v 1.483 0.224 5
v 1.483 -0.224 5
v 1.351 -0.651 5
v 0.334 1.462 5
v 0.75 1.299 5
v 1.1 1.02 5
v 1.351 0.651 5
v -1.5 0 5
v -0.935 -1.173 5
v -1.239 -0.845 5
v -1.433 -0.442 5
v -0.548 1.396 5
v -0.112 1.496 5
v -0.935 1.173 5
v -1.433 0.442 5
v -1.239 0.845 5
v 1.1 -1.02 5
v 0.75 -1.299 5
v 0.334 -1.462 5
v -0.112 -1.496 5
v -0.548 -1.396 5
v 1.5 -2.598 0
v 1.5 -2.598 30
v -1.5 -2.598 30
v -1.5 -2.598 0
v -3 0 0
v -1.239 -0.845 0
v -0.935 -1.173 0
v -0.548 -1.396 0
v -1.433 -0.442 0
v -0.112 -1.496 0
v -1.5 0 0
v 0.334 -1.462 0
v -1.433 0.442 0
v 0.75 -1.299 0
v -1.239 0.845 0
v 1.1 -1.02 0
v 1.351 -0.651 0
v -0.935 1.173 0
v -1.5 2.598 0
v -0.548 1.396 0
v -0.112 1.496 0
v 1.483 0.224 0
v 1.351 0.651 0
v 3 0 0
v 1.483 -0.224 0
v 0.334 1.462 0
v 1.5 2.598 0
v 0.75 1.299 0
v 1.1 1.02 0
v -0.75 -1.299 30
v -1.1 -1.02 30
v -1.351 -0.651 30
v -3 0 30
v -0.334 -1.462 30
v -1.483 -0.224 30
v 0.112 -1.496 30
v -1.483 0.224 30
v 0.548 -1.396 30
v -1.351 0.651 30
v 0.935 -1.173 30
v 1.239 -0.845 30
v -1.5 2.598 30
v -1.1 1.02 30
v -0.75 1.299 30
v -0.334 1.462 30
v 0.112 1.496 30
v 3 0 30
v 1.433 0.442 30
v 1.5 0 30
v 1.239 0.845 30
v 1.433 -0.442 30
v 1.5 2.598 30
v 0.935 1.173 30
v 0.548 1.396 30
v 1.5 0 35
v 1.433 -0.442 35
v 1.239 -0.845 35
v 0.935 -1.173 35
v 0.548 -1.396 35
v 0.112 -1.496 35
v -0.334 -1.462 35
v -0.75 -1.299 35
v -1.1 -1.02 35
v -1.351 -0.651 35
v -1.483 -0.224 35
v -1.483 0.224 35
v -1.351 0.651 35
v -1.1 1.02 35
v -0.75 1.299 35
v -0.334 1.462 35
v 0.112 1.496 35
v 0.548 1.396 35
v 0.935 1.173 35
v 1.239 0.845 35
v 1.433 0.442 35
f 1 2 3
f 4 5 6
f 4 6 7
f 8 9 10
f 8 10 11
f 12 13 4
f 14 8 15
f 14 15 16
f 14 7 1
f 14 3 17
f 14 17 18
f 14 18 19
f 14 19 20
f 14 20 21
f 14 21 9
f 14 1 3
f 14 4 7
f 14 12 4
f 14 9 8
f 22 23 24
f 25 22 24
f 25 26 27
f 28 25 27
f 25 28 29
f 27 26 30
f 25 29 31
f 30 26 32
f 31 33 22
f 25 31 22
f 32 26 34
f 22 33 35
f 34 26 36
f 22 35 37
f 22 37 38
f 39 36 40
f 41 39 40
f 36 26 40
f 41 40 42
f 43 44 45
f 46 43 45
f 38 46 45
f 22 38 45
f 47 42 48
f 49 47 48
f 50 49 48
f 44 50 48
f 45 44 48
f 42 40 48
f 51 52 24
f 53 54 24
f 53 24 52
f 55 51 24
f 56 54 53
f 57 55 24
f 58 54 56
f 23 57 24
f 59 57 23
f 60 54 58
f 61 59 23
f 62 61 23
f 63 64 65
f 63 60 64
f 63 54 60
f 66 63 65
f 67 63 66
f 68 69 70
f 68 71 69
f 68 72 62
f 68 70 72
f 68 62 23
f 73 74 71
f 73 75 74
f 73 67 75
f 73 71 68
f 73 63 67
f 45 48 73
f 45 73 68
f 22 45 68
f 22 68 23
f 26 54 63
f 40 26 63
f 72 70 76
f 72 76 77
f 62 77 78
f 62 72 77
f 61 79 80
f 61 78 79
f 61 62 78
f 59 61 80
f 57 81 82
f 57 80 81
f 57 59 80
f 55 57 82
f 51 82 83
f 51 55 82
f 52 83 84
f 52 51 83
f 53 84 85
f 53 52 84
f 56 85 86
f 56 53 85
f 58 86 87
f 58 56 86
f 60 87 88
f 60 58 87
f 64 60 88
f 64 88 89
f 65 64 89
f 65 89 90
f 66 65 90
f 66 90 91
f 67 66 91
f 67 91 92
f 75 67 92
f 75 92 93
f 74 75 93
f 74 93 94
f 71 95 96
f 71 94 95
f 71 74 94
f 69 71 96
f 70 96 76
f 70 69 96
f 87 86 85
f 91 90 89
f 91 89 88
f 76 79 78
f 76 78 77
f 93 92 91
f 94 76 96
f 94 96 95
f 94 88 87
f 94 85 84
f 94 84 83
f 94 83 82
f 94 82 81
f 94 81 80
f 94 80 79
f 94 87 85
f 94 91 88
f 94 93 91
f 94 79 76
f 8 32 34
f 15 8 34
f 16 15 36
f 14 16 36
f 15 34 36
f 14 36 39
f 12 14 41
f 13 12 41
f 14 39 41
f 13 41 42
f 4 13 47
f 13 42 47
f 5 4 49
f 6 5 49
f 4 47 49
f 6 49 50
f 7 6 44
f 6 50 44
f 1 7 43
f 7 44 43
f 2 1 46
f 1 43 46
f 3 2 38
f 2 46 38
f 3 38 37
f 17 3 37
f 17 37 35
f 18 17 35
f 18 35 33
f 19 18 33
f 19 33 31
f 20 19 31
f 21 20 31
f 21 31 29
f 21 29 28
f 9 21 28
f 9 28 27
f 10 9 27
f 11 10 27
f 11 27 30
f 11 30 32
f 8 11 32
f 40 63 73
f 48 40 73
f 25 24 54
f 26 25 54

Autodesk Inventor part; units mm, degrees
ref_plane "YZ Plane" through (0, 0, 0) normal (1, 0, 0) x (0, 1, 0)
ref_plane "XZ Plane" through (0, 0, 0) normal (0, 1, 0) x (-1, 0, 0)
ref_plane "XY Plane" through (0, 0, 0) normal (0, 0, 1) x (1, 0, 0)
sketch "스케치1" plane through (0, 0, 0) normal (0, 0, 1) x (1, 0, 0)
  line L0 (-3, 0) -> (-1.5, 2.5981)
  line L1 (-1.5, 2.5981) -> (1.5, 2.5981)
  line L2 (1.5, 2.5981) -> (3, 0)
  line L3 (3, 0) -> (1.5, -2.5981)
  line L4 (1.5, -2.5981) -> (-1.5, -2.5981)
  line L5 (-1.5, -2.5981) -> (-3, 0)
  point P0 (0, 0)
  point P1 (0, 0)
  dimension "d0" = 6
extrude "돌출1" add sketch "스케치1" along normal blind 30
sketch "스케치2" plane through (0, 0, 30) normal (0, 0, 1) x (1, 0, 0)
  circle A0 centre (0, 0) radius 1.5
  dimension "d3" = 3
extrude "돌출2" add sketch "스케치2" along normal blind 5
sketch "스케치3" plane through (0, 0, 0) normal (0, 0, -1) x (-1, 0, 0)
  circle A0 centre (0, 0) radius 1.5
  dimension "d6" = 3
extrude "돌출3" cut sketch "스케치3" against normal blind 5
properties part number "50mm지지대"
